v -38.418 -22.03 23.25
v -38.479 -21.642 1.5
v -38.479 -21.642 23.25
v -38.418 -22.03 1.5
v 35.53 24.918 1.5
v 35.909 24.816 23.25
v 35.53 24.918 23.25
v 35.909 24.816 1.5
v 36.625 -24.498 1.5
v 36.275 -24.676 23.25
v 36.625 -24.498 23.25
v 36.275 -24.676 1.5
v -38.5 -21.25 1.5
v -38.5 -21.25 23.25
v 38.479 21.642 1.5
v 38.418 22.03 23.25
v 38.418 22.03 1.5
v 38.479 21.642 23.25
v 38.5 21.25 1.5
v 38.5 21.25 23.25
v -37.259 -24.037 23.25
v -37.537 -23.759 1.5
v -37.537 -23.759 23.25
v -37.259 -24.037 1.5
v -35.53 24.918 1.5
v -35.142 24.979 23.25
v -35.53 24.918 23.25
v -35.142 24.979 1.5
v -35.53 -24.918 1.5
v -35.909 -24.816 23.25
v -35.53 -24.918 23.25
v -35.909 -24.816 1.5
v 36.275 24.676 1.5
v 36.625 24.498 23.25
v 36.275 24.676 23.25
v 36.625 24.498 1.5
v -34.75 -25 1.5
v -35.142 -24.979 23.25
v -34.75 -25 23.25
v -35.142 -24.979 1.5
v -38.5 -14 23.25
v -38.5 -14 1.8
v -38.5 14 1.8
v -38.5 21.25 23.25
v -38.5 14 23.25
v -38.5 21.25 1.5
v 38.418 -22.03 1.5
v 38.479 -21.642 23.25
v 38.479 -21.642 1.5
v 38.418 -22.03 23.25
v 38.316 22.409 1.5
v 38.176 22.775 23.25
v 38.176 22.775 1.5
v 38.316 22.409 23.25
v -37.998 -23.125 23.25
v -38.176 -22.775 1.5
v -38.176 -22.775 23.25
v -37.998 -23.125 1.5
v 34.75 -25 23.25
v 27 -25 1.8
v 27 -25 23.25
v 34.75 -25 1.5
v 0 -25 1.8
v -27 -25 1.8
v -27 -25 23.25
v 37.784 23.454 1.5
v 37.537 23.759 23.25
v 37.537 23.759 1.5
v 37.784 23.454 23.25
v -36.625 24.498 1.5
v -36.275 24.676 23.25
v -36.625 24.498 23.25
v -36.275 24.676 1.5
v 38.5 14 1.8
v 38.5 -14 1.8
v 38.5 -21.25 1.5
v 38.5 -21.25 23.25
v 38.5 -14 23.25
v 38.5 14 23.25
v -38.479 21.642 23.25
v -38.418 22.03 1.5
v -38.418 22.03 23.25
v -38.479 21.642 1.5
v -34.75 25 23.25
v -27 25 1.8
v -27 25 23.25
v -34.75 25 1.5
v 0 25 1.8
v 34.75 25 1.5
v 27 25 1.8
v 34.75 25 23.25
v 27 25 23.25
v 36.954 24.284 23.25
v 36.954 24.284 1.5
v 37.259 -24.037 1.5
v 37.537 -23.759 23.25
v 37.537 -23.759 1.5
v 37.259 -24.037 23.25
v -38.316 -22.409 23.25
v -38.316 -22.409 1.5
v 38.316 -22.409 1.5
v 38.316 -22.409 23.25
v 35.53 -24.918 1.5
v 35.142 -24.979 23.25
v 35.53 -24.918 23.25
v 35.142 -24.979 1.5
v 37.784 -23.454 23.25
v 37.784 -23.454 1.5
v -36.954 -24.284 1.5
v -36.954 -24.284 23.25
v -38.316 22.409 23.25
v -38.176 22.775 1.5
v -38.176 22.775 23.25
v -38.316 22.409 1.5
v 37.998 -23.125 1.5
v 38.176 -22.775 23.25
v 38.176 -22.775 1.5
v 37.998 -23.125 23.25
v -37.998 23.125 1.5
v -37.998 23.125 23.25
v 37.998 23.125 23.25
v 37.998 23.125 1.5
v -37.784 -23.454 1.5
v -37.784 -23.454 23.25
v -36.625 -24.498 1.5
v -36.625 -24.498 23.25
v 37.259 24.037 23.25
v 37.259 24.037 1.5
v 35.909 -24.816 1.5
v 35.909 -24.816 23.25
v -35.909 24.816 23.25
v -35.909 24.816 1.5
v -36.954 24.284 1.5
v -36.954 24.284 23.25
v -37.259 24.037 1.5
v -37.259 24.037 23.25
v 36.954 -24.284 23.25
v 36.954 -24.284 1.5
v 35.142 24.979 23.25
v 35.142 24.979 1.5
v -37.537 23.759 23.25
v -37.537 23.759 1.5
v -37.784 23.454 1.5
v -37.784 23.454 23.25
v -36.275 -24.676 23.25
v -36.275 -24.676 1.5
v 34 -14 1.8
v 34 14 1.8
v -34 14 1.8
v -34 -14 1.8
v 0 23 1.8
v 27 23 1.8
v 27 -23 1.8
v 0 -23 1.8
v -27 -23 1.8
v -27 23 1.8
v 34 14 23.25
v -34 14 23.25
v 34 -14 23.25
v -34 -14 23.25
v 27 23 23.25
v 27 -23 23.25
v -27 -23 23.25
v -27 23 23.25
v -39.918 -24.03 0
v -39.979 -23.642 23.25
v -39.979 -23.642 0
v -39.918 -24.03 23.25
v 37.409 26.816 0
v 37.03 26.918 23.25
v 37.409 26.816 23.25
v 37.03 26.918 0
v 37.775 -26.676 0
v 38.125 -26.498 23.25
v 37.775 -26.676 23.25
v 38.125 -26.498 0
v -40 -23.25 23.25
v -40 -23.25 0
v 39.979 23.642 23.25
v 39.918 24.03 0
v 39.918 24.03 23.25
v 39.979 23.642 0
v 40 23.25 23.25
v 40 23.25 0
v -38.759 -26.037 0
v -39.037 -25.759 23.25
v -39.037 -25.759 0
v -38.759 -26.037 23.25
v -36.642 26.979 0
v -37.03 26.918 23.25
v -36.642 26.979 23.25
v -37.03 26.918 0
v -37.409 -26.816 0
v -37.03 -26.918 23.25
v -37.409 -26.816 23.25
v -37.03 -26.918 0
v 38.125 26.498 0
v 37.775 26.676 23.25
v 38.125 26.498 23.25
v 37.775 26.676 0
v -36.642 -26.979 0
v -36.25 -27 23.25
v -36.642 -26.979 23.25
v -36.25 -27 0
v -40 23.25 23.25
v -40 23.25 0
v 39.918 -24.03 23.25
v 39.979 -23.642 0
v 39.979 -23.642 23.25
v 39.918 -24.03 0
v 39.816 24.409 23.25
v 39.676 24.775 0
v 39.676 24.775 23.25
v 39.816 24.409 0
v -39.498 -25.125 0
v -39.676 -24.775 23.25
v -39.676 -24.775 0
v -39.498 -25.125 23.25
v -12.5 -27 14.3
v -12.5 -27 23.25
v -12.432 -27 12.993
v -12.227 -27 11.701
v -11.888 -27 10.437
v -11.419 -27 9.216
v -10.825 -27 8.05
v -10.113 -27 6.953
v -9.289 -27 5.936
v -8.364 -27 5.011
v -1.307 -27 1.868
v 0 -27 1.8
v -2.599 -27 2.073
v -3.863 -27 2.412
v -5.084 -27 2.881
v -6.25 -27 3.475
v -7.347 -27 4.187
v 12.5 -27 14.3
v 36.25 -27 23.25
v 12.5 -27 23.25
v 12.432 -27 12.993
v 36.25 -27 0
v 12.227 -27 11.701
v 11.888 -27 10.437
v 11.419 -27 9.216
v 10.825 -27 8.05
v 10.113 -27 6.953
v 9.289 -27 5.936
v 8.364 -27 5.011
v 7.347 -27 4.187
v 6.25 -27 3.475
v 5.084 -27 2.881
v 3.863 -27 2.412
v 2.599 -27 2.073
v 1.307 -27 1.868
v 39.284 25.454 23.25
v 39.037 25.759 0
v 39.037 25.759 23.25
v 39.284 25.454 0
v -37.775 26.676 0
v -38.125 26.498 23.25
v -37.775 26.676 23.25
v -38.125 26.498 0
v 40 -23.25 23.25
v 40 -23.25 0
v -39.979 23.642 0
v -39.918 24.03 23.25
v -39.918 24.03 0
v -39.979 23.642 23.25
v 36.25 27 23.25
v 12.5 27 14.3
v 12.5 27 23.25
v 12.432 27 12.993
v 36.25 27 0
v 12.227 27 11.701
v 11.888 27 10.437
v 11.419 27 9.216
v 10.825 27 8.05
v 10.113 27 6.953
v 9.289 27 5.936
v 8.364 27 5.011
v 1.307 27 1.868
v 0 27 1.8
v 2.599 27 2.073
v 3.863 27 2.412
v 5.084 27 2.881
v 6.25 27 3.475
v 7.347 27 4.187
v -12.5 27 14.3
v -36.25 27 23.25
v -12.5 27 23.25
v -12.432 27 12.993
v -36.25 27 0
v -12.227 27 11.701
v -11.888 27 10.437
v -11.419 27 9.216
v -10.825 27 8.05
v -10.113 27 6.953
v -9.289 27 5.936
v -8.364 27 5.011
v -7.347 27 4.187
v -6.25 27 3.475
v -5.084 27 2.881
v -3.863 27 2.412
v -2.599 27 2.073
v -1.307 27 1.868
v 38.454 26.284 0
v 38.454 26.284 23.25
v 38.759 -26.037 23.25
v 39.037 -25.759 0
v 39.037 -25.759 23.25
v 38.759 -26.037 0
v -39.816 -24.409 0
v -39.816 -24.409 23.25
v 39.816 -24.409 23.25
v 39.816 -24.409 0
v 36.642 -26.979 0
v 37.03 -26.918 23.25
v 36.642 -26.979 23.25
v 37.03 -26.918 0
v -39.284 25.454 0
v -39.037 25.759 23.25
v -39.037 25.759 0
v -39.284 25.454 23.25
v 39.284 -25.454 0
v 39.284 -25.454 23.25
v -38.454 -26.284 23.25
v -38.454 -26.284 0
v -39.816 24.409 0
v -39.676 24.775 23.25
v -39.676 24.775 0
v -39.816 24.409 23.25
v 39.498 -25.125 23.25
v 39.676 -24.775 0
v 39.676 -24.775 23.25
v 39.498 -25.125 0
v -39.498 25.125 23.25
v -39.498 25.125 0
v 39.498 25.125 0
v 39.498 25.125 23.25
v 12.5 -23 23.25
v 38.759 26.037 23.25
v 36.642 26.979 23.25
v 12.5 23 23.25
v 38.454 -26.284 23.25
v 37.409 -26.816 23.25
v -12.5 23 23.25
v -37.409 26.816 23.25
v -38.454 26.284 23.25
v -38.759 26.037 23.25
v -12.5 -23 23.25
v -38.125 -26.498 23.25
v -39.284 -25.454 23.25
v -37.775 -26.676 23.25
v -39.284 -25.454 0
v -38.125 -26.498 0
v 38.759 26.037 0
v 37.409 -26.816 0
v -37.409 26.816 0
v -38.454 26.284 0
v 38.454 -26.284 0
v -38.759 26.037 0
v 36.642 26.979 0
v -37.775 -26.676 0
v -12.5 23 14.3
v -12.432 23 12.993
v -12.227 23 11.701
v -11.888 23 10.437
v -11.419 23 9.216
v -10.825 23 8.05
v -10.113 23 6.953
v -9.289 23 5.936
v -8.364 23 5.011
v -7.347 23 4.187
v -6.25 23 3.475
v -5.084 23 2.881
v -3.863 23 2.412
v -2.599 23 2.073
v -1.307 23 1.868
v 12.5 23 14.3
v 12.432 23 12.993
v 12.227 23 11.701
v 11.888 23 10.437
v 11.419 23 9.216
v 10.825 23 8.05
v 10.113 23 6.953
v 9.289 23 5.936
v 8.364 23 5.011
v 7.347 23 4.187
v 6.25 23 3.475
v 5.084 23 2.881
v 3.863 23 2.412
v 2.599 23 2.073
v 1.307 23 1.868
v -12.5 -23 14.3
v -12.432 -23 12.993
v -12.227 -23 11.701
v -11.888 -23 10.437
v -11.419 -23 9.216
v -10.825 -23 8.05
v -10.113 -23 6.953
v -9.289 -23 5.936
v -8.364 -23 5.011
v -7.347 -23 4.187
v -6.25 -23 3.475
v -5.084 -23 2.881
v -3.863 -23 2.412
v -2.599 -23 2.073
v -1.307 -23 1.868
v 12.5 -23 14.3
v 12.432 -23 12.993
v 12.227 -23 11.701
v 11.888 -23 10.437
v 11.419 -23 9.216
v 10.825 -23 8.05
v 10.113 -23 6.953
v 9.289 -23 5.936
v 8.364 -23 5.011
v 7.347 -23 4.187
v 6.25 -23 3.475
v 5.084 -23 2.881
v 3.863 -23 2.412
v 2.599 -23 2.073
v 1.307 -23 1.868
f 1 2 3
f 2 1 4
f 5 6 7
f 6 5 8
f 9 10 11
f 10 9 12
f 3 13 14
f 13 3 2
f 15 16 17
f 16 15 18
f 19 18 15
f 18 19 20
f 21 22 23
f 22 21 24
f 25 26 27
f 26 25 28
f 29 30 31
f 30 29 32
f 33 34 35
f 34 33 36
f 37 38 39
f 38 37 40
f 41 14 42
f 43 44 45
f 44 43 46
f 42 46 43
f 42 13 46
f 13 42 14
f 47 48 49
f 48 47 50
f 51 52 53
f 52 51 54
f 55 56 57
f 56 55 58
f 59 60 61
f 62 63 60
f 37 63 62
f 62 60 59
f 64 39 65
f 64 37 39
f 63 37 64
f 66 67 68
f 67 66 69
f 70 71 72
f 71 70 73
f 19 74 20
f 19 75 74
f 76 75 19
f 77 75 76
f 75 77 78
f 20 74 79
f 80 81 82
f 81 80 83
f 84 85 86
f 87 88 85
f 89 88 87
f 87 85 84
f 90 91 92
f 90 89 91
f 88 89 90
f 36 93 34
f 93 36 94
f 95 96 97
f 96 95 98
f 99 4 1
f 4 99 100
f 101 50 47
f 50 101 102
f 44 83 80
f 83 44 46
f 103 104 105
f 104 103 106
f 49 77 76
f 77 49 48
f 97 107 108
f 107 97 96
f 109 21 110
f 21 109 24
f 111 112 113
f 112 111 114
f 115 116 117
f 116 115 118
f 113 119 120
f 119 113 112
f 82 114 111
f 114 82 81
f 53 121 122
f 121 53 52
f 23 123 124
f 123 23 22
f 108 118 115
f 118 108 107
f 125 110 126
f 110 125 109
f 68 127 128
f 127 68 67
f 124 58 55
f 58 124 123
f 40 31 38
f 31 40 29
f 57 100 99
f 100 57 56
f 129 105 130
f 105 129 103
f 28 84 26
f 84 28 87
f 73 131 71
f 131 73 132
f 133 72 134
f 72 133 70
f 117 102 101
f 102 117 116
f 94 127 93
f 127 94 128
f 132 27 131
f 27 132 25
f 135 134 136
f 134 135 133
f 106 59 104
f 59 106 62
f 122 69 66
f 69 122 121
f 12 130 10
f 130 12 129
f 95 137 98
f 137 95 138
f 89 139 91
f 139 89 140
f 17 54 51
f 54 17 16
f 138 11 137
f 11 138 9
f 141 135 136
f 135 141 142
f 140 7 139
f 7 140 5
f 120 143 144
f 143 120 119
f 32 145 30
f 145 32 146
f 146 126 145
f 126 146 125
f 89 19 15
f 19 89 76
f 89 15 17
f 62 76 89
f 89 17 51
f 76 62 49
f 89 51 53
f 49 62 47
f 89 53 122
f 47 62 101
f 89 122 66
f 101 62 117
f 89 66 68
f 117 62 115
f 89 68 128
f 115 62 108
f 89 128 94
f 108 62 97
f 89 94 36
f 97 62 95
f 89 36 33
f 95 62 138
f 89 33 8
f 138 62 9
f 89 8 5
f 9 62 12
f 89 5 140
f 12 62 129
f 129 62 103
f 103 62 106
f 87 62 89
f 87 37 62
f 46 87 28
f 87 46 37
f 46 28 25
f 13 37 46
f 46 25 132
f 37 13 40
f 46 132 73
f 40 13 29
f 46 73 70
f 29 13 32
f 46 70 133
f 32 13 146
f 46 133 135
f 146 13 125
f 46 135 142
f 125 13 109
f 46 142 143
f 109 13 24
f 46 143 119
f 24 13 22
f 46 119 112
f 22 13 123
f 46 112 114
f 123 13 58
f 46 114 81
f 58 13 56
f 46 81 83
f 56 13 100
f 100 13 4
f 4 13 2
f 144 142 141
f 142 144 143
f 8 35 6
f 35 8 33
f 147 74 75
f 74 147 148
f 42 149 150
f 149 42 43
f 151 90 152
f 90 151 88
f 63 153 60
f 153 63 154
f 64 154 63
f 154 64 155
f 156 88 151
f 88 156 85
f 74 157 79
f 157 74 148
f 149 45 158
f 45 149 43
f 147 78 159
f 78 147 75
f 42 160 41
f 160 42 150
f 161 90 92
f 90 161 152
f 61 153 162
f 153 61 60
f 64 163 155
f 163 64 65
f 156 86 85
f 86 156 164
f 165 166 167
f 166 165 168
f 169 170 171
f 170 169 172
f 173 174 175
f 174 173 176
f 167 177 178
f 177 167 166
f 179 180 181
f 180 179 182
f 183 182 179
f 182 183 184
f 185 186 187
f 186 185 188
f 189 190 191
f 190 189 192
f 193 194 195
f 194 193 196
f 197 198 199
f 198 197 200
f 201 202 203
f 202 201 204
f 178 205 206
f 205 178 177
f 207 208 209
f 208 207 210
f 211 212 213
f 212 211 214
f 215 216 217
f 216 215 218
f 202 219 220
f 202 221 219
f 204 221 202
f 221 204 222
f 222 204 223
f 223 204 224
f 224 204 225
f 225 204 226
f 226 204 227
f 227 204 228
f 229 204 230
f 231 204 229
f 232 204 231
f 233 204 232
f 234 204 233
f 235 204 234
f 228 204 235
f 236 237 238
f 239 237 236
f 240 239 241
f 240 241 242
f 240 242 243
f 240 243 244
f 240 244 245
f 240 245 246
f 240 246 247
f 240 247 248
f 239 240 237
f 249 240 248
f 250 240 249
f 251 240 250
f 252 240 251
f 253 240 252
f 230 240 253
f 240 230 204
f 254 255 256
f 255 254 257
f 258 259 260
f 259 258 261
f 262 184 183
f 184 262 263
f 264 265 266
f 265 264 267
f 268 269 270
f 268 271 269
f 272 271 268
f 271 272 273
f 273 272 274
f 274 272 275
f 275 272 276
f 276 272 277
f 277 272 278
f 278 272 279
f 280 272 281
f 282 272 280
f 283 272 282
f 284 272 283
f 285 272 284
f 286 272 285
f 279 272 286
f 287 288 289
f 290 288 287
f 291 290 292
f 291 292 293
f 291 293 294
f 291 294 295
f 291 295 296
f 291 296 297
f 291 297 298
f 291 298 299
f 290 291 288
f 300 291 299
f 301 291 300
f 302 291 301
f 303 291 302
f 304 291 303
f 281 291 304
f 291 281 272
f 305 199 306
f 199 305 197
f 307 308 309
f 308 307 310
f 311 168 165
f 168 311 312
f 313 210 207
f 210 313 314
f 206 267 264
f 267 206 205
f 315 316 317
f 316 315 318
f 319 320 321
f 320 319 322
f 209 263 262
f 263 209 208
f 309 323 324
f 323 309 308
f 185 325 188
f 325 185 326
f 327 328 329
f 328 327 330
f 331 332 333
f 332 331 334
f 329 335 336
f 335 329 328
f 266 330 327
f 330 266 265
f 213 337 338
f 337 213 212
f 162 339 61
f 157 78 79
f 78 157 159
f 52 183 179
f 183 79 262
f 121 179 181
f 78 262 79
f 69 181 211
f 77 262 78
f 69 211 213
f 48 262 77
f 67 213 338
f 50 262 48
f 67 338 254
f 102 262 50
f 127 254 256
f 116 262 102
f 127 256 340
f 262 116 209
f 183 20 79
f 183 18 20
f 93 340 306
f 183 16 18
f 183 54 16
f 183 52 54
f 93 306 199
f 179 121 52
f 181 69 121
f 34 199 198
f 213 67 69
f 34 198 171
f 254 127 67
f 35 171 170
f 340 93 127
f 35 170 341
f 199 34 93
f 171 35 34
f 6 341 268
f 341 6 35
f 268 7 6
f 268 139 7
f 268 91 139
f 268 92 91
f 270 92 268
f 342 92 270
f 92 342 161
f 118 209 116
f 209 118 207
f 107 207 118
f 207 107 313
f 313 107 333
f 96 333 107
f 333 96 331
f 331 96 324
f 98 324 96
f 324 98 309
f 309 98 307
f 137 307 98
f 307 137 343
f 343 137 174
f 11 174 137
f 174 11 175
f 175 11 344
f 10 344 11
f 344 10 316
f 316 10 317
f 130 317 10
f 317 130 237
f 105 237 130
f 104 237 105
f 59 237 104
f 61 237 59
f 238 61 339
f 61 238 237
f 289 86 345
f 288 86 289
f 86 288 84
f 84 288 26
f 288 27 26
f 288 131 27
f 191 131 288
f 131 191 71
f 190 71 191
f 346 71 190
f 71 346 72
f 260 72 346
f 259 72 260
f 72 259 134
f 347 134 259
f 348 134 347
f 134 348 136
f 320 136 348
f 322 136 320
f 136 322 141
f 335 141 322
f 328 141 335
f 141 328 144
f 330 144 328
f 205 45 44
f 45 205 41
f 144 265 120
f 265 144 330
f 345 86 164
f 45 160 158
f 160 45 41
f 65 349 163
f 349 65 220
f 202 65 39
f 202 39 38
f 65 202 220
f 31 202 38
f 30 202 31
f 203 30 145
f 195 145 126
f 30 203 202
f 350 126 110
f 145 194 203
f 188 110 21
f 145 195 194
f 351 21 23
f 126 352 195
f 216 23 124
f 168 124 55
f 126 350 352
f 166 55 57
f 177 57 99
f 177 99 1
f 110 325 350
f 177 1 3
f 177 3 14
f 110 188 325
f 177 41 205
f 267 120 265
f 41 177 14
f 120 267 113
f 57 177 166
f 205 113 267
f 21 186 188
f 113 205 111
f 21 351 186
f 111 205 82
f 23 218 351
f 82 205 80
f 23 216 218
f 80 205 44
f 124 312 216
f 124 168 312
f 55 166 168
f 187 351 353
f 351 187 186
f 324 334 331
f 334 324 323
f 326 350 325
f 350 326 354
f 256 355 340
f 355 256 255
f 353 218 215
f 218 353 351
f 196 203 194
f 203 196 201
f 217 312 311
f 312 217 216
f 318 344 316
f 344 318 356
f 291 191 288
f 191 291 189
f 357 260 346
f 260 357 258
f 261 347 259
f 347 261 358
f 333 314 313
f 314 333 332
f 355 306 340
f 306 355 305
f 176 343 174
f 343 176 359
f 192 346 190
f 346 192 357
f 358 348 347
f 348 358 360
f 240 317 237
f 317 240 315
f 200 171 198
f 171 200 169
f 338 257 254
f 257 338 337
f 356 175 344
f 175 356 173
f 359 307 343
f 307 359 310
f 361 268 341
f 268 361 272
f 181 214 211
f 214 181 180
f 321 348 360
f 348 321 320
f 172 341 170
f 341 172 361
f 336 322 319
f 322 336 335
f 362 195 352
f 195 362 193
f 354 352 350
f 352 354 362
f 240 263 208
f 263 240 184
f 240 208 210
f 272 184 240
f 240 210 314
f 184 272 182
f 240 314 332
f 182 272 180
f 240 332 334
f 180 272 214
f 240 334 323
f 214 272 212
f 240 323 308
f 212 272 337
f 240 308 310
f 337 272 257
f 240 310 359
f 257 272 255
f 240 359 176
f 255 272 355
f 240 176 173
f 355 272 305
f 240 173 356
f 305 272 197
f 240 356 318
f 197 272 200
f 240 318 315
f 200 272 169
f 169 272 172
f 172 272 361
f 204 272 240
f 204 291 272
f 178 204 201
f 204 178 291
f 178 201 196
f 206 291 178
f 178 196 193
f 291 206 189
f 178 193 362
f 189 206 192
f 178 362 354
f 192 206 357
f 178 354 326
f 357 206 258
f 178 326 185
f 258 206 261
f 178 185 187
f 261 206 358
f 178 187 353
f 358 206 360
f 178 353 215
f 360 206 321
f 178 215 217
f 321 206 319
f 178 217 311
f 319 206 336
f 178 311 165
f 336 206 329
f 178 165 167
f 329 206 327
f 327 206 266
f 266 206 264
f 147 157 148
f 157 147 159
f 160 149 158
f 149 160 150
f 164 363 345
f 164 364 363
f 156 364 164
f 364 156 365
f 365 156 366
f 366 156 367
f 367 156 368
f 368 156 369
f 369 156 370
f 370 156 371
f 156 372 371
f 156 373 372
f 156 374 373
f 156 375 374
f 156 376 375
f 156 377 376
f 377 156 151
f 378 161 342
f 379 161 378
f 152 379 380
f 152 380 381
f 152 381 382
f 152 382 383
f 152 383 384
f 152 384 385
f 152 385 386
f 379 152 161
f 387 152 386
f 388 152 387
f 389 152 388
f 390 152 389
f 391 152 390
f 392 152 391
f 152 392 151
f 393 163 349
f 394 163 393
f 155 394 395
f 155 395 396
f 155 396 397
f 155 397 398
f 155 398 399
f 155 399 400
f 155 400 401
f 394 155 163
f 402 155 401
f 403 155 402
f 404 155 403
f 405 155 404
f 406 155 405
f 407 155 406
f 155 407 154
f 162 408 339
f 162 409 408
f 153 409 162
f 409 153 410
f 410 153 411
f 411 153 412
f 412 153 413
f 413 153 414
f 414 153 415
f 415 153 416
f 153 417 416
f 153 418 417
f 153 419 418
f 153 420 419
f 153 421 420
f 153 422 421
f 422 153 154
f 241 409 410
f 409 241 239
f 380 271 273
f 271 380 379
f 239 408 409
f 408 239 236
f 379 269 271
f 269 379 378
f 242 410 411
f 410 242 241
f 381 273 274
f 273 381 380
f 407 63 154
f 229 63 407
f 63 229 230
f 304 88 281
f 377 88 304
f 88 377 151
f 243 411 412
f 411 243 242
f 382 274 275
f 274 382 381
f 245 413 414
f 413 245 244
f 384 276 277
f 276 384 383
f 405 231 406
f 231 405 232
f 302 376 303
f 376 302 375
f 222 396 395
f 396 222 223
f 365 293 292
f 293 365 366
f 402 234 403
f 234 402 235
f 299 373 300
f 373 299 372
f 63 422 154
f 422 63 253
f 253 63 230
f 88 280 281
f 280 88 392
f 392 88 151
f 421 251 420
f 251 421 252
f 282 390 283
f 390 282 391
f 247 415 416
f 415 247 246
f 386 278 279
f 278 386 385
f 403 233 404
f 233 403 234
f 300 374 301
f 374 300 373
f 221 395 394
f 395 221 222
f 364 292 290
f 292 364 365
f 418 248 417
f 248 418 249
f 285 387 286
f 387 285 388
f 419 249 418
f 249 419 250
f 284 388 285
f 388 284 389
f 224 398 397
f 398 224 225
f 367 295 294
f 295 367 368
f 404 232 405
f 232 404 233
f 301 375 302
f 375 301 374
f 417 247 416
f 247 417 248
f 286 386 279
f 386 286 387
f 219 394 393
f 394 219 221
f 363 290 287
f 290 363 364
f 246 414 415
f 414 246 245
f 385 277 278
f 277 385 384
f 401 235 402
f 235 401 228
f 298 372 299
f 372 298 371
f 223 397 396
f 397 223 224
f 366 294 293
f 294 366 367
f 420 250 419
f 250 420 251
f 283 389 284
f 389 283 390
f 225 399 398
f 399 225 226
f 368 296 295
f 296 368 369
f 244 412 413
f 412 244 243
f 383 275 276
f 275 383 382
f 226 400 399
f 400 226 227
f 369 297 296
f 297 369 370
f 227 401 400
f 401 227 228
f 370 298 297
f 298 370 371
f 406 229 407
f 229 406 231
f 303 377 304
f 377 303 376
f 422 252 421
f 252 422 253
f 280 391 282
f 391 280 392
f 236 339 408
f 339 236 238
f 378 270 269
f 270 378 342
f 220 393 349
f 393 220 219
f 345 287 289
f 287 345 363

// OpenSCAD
/* long-bits-bin.scad
 *
 * Copyright (C) Robert B. Ross, 2016
 *
 * This software is released under the Creative Commons
 * Attribution-ShareAlike 4.0 International Public License.
 */

/* Note: Abusing roundBoxBottom() a lot in this source, to create whole
 *       forms for diff()'ing, etc.
 */

$fn=80;

include <./bintools.scad>

/* Harbor Freight Medium
 * 46.5mm tall
 * 48.6mm tall with legs
 * 80mm wide, 77 bottom
 * 54mm length, 52 bottom
 */

/* Card with Sleeve
 * 46x68mm seems like a good slot size
 */

difference() {
   union() {
      /* abusing roundBoxBottom() to make entire box shape */
      roundBoxBottom(xDim=80, yDim=54, ht=46.5/2, cornerRad=3.75);
   }
   /* center section, for cards */
   difference() {
      translate([0,0,1.5]) roundBoxBottom(xDim=77, yDim=50, ht=46.5/2, cornerRad=3.75);
      translate([0,0,46.5/4+1.8]) cube([77,28, 46.5/2], center=true);
      translate([0,0,46.5/4+1.8]) cube([54,50, 46.5/2], center=true);
   }
   /* actual space for the cards 68x46 */
   translate([0,0,46.5/4+1.8]) cube([68,46, 46.5/2], center=true);

   /* card access from the sides */
   translate([0,-30,12.5+1.8]) rotate([-90,0,0]) cylinder(r=12.5,h=60);
   translate([0,0,15+12.5+1.8]) cube([25,60,30],center=true);
}

/*
 * Local variables:
 *  mode: C
 *  c-indent-level: 4
 *  c-basic-offset: 4
 * End:
 *
 * vim: ts=8 sts=4 sw=4 expandtab
 */
